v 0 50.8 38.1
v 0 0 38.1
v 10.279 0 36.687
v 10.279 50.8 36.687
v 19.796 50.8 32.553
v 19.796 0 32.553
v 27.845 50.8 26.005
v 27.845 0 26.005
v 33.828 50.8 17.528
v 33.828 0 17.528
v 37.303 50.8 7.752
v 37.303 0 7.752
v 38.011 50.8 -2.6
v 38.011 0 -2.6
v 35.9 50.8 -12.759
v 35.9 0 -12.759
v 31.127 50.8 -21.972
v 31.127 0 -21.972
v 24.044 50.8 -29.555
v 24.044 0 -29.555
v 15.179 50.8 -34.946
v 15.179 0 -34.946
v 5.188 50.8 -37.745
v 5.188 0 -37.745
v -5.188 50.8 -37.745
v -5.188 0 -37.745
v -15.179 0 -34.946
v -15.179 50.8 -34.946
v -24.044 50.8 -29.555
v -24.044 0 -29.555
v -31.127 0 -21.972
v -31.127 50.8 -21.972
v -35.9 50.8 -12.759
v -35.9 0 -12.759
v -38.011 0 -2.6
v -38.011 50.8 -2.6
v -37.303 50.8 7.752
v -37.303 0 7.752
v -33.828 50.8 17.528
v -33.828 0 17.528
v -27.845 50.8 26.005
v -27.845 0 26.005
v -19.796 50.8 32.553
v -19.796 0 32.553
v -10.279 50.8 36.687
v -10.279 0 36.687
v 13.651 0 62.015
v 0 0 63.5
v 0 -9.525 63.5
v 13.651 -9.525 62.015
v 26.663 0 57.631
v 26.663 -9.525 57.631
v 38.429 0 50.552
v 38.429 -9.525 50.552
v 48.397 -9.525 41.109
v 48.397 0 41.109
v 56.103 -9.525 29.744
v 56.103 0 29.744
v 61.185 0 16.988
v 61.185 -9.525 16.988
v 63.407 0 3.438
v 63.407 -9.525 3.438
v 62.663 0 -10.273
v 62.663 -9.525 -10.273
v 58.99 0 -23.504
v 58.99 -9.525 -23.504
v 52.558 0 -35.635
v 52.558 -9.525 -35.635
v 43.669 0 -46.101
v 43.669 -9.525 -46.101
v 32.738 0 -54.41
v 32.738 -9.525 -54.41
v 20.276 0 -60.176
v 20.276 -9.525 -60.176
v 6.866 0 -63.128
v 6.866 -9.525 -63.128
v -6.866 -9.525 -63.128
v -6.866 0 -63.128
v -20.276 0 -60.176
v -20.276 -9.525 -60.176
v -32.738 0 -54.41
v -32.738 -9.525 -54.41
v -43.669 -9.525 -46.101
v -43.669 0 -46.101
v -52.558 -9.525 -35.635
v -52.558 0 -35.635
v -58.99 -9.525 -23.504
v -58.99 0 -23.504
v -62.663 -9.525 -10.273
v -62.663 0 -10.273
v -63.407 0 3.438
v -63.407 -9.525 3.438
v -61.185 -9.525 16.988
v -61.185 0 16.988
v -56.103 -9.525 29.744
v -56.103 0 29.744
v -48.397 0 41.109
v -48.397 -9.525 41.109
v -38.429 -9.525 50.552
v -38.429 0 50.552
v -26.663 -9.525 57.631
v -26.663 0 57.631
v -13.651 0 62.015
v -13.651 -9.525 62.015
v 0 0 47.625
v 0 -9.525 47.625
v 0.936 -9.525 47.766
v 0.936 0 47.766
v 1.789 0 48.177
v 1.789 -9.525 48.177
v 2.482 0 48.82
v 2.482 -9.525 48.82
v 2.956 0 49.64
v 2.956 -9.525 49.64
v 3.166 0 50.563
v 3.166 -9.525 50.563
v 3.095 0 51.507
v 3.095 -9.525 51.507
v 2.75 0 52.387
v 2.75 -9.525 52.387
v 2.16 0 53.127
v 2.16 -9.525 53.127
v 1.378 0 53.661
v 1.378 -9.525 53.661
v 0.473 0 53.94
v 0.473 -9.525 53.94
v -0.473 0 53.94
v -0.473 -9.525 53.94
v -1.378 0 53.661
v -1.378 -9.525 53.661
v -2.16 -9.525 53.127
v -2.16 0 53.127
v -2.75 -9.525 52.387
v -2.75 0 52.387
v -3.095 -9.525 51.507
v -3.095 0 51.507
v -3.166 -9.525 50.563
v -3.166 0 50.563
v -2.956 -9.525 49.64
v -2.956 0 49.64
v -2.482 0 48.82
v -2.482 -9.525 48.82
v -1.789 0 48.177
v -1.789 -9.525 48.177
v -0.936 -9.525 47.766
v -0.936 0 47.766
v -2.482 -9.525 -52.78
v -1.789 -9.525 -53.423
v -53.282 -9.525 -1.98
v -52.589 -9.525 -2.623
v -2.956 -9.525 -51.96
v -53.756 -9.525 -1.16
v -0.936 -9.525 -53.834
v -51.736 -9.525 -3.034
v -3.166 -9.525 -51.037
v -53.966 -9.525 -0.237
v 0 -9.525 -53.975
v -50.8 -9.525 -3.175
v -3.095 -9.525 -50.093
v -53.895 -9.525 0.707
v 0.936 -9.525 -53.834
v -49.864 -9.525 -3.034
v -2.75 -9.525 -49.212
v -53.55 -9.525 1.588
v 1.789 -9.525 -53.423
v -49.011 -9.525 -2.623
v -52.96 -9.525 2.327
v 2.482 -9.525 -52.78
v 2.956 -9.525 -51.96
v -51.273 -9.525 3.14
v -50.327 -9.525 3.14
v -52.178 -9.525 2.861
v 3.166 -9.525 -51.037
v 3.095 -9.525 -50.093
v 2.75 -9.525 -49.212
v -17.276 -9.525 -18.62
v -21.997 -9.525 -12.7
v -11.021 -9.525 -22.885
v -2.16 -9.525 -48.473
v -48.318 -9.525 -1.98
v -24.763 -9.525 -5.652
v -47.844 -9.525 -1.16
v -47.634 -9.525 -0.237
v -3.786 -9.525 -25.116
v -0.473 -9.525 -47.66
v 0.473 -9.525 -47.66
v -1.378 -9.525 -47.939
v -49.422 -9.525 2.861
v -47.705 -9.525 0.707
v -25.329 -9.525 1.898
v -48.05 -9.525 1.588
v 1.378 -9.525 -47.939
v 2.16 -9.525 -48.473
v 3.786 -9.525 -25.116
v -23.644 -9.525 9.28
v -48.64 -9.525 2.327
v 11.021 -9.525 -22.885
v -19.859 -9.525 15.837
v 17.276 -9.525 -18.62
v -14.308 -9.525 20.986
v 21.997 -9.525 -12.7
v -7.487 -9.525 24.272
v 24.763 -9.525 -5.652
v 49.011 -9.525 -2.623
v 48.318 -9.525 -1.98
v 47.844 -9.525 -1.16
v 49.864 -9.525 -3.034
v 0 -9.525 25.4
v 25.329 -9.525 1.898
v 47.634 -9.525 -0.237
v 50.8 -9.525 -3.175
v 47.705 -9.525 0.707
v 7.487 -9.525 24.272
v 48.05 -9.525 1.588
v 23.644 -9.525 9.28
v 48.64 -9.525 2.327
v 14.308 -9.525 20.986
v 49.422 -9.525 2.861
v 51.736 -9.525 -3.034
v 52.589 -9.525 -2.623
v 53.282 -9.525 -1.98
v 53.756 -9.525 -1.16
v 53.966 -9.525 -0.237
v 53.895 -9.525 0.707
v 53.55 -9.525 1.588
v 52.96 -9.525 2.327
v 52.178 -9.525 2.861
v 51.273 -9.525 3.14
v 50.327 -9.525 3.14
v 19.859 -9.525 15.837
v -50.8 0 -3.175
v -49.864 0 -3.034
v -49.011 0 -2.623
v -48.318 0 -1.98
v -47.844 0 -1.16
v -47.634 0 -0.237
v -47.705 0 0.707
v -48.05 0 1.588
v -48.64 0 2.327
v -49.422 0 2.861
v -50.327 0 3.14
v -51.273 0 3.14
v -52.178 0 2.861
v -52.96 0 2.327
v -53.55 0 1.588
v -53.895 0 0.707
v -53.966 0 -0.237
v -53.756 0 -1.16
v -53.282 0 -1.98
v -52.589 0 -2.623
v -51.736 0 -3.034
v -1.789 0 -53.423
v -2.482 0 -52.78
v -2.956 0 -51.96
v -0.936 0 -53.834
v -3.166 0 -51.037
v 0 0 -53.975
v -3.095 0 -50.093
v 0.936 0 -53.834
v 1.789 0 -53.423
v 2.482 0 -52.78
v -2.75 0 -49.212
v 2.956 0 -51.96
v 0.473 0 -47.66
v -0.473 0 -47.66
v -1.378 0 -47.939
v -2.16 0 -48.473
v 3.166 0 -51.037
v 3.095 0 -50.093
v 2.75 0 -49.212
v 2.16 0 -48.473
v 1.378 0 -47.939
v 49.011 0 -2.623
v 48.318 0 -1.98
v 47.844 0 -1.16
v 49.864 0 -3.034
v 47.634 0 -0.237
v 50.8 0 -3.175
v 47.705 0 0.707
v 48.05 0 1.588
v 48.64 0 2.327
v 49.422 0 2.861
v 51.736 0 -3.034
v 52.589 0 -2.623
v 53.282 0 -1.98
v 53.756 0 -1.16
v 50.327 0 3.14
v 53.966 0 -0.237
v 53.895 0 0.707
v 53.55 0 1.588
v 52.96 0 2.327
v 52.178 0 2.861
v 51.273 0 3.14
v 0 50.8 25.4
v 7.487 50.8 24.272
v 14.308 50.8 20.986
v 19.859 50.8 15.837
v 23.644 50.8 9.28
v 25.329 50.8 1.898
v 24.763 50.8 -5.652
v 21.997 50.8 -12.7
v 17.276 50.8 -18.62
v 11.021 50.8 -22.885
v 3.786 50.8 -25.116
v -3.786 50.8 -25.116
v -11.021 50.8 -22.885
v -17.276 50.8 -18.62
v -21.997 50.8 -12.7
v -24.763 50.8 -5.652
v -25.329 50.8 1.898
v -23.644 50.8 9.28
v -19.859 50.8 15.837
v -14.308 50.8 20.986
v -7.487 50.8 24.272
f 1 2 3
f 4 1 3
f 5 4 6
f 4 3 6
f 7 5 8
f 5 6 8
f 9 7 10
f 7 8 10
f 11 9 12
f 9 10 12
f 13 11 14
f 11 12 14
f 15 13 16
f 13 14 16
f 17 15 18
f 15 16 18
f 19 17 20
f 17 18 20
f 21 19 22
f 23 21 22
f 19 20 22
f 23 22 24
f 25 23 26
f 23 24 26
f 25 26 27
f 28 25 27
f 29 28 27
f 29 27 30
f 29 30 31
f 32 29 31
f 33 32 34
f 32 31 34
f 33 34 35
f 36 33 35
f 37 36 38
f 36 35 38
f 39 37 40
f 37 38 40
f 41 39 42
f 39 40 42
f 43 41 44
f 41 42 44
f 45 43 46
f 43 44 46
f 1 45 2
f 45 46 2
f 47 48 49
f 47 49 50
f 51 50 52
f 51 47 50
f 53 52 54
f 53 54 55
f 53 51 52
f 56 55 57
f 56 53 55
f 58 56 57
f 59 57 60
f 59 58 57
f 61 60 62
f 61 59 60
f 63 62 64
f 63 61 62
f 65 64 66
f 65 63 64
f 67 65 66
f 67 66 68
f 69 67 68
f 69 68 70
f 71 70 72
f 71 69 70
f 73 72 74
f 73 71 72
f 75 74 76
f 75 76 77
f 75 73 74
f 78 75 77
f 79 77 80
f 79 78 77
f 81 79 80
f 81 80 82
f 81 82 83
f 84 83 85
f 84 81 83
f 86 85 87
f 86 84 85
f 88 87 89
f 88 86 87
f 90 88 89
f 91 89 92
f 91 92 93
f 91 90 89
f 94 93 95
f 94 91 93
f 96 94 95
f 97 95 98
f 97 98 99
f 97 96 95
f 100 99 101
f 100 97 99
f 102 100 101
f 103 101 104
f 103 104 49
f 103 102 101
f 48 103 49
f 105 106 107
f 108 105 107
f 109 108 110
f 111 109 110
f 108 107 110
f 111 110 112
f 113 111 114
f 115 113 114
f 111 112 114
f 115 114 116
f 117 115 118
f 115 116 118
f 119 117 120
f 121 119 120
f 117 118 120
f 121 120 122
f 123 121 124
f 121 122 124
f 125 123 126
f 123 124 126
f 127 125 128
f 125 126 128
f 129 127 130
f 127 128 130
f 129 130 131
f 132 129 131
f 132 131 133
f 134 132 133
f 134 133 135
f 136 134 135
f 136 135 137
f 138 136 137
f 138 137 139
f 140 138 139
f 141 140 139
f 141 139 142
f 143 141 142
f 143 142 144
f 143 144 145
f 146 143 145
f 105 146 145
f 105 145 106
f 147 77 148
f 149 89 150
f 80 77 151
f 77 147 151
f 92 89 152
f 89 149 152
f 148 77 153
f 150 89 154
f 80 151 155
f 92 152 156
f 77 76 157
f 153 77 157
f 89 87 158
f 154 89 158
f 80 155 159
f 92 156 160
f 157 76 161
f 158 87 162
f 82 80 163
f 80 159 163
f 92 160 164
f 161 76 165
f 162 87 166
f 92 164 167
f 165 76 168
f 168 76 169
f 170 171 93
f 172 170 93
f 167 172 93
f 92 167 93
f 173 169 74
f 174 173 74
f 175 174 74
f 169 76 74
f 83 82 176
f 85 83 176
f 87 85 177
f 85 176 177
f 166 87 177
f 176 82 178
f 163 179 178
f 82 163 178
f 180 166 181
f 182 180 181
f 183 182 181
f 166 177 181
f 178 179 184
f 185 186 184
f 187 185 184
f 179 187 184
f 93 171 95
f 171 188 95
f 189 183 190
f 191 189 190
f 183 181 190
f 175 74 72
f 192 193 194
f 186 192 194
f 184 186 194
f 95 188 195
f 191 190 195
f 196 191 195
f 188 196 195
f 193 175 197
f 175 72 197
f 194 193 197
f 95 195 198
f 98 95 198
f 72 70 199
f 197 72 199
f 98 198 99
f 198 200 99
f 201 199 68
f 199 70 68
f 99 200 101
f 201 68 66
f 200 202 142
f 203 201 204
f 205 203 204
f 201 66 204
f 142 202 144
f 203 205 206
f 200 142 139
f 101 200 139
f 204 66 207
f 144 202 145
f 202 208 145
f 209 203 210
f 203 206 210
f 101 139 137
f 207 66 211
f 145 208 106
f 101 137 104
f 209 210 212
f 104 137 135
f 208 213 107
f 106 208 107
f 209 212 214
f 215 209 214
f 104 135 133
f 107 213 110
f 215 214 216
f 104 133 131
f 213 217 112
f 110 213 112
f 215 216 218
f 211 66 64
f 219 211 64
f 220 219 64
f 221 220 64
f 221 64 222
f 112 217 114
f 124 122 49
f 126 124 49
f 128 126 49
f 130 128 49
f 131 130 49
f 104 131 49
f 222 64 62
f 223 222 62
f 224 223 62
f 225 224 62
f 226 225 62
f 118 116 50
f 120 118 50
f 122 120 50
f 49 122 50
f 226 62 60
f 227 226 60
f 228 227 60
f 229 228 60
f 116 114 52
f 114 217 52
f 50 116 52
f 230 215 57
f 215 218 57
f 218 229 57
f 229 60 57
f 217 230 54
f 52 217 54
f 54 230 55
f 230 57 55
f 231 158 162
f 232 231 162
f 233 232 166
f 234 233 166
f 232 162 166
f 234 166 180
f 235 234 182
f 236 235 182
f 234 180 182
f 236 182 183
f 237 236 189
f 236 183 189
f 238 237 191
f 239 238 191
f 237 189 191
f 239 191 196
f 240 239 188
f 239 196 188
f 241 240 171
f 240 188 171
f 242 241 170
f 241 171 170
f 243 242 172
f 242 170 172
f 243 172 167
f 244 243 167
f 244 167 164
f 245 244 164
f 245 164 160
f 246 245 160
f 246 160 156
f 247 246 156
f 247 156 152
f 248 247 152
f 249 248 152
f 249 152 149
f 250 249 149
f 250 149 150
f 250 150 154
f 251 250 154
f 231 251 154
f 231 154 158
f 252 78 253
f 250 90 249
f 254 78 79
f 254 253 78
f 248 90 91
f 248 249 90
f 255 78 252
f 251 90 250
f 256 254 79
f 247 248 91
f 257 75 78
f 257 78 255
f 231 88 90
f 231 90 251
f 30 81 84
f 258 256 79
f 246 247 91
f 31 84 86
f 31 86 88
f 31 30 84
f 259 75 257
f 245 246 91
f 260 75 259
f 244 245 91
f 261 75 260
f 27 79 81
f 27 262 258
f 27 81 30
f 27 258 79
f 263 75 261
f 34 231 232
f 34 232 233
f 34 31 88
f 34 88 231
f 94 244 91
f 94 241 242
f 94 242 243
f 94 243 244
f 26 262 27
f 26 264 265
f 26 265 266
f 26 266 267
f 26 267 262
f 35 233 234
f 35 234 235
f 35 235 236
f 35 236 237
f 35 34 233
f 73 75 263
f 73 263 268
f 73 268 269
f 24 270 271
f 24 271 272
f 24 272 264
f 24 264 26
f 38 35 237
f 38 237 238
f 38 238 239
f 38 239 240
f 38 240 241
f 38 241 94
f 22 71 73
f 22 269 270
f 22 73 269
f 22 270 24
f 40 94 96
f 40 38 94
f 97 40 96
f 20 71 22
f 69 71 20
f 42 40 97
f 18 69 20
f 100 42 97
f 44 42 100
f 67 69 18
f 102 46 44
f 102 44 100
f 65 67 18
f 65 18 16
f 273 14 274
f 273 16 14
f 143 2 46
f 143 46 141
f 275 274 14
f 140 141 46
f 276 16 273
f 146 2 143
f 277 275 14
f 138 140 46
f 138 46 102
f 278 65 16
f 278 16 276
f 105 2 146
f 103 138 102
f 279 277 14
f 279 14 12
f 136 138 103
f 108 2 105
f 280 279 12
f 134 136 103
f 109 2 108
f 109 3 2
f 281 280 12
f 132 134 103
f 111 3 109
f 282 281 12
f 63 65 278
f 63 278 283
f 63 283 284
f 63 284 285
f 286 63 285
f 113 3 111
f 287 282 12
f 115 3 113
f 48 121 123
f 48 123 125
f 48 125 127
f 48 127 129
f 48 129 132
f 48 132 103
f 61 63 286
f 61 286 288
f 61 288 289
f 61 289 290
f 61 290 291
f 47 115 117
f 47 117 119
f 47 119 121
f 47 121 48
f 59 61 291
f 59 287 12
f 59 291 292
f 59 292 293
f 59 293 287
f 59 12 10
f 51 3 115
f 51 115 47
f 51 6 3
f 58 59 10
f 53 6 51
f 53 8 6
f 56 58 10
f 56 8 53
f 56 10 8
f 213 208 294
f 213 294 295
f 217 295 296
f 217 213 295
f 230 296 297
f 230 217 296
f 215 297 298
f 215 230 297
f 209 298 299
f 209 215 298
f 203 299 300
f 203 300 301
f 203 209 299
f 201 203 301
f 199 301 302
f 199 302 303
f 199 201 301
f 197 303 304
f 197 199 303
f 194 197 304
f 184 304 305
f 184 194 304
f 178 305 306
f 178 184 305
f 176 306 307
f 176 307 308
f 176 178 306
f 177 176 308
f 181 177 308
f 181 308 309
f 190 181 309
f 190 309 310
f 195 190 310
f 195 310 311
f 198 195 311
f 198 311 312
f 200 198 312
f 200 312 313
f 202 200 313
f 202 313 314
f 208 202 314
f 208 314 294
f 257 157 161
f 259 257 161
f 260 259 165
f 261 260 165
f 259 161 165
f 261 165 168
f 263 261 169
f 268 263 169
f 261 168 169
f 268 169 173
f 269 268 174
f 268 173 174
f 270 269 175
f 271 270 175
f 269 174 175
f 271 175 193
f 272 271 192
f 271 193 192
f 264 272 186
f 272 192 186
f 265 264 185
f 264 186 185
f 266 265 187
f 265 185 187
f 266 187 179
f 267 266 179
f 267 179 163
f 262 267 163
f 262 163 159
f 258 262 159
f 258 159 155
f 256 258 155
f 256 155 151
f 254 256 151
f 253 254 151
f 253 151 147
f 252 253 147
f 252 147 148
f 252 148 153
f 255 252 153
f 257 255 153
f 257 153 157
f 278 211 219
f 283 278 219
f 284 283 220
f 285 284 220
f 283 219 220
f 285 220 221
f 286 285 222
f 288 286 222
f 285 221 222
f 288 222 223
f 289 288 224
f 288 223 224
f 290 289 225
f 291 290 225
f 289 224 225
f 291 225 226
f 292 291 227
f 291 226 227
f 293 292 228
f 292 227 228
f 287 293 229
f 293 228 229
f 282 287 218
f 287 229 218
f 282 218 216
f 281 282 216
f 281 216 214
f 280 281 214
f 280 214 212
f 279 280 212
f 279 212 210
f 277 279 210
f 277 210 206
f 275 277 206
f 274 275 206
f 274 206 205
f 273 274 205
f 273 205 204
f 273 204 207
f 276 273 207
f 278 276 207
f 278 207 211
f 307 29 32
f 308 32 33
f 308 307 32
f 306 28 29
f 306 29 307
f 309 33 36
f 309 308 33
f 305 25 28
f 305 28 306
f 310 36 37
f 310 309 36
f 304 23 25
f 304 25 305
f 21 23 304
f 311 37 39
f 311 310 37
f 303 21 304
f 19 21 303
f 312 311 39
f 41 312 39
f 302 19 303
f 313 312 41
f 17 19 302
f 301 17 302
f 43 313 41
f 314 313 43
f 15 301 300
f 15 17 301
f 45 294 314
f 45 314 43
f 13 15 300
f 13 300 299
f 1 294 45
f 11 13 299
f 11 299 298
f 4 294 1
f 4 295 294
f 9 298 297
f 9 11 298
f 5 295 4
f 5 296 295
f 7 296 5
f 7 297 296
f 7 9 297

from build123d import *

# Parameters (mm, degrees)
SKETCH2_R               = 63.5
BOSS_EXTRUDE1_DEPTH     = 9.525
SKETCH2_3_R             = 38.1
BOSS_EXTRUDE2_DEPTH     = 50.8
CUT_EXTRUDE1_DEPTH      = 50.8
CUT_EXTRUDE1_DEPTH_BACK = 50.8
SKETCH2_4_R             = 25.4
SKETCH3_R               = 3.175
CUT_EXTRUDE2_DEPTH      = 50.8


with BuildPart() as part:
    # Sketch2 → Boss-Extrude1 (new body)
    with BuildSketch(Plane(origin=(0, 0, 0), x_dir=(1, 0, 0), z_dir=(0, 1, 0))):
        Circle(SKETCH2_R)
    extrude(amount=-BOSS_EXTRUDE1_DEPTH)

    # Sketch2<3> → Boss-Extrude2 (add)
    with BuildSketch(Plane(origin=(0, 0, 0), x_dir=(1, 0, 0), z_dir=(0, 1, 0))):
        Circle(SKETCH2_3_R)
    extrude(amount=BOSS_EXTRUDE2_DEPTH)

    # Sketch2<4> → Cut-Extrude1 (cut, two sides: drawn at the far end of the back side and taken through both)
    with BuildSketch(Plane(origin=(0, 0, 0), x_dir=(1, 0, 0), z_dir=(0, 1, 0)).offset(-CUT_EXTRUDE1_DEPTH_BACK)):
        Circle(SKETCH2_4_R)
    extrude(amount=CUT_EXTRUDE1_DEPTH + CUT_EXTRUDE1_DEPTH_BACK, mode=Mode.SUBTRACT)

    # Sketch3 → Cut-Extrude2 (cut)
    with BuildSketch(Plane(origin=(0, -9.525, 0), x_dir=(-1, 0, 0), z_dir=(0, -1, 0))):
        with Locations((0, -50.8)):
            Circle(SKETCH3_R)
        with Locations((-50.8, 0)):
            Circle(SKETCH3_R)
        with Locations((0, 50.8)):
            Circle(SKETCH3_R)
        with Locations((50.8, 0)):
            Circle(SKETCH3_R)
    extrude(amount=-CUT_EXTRUDE2_DEPTH, mode=Mode.SUBTRACT)


solid = part.part
